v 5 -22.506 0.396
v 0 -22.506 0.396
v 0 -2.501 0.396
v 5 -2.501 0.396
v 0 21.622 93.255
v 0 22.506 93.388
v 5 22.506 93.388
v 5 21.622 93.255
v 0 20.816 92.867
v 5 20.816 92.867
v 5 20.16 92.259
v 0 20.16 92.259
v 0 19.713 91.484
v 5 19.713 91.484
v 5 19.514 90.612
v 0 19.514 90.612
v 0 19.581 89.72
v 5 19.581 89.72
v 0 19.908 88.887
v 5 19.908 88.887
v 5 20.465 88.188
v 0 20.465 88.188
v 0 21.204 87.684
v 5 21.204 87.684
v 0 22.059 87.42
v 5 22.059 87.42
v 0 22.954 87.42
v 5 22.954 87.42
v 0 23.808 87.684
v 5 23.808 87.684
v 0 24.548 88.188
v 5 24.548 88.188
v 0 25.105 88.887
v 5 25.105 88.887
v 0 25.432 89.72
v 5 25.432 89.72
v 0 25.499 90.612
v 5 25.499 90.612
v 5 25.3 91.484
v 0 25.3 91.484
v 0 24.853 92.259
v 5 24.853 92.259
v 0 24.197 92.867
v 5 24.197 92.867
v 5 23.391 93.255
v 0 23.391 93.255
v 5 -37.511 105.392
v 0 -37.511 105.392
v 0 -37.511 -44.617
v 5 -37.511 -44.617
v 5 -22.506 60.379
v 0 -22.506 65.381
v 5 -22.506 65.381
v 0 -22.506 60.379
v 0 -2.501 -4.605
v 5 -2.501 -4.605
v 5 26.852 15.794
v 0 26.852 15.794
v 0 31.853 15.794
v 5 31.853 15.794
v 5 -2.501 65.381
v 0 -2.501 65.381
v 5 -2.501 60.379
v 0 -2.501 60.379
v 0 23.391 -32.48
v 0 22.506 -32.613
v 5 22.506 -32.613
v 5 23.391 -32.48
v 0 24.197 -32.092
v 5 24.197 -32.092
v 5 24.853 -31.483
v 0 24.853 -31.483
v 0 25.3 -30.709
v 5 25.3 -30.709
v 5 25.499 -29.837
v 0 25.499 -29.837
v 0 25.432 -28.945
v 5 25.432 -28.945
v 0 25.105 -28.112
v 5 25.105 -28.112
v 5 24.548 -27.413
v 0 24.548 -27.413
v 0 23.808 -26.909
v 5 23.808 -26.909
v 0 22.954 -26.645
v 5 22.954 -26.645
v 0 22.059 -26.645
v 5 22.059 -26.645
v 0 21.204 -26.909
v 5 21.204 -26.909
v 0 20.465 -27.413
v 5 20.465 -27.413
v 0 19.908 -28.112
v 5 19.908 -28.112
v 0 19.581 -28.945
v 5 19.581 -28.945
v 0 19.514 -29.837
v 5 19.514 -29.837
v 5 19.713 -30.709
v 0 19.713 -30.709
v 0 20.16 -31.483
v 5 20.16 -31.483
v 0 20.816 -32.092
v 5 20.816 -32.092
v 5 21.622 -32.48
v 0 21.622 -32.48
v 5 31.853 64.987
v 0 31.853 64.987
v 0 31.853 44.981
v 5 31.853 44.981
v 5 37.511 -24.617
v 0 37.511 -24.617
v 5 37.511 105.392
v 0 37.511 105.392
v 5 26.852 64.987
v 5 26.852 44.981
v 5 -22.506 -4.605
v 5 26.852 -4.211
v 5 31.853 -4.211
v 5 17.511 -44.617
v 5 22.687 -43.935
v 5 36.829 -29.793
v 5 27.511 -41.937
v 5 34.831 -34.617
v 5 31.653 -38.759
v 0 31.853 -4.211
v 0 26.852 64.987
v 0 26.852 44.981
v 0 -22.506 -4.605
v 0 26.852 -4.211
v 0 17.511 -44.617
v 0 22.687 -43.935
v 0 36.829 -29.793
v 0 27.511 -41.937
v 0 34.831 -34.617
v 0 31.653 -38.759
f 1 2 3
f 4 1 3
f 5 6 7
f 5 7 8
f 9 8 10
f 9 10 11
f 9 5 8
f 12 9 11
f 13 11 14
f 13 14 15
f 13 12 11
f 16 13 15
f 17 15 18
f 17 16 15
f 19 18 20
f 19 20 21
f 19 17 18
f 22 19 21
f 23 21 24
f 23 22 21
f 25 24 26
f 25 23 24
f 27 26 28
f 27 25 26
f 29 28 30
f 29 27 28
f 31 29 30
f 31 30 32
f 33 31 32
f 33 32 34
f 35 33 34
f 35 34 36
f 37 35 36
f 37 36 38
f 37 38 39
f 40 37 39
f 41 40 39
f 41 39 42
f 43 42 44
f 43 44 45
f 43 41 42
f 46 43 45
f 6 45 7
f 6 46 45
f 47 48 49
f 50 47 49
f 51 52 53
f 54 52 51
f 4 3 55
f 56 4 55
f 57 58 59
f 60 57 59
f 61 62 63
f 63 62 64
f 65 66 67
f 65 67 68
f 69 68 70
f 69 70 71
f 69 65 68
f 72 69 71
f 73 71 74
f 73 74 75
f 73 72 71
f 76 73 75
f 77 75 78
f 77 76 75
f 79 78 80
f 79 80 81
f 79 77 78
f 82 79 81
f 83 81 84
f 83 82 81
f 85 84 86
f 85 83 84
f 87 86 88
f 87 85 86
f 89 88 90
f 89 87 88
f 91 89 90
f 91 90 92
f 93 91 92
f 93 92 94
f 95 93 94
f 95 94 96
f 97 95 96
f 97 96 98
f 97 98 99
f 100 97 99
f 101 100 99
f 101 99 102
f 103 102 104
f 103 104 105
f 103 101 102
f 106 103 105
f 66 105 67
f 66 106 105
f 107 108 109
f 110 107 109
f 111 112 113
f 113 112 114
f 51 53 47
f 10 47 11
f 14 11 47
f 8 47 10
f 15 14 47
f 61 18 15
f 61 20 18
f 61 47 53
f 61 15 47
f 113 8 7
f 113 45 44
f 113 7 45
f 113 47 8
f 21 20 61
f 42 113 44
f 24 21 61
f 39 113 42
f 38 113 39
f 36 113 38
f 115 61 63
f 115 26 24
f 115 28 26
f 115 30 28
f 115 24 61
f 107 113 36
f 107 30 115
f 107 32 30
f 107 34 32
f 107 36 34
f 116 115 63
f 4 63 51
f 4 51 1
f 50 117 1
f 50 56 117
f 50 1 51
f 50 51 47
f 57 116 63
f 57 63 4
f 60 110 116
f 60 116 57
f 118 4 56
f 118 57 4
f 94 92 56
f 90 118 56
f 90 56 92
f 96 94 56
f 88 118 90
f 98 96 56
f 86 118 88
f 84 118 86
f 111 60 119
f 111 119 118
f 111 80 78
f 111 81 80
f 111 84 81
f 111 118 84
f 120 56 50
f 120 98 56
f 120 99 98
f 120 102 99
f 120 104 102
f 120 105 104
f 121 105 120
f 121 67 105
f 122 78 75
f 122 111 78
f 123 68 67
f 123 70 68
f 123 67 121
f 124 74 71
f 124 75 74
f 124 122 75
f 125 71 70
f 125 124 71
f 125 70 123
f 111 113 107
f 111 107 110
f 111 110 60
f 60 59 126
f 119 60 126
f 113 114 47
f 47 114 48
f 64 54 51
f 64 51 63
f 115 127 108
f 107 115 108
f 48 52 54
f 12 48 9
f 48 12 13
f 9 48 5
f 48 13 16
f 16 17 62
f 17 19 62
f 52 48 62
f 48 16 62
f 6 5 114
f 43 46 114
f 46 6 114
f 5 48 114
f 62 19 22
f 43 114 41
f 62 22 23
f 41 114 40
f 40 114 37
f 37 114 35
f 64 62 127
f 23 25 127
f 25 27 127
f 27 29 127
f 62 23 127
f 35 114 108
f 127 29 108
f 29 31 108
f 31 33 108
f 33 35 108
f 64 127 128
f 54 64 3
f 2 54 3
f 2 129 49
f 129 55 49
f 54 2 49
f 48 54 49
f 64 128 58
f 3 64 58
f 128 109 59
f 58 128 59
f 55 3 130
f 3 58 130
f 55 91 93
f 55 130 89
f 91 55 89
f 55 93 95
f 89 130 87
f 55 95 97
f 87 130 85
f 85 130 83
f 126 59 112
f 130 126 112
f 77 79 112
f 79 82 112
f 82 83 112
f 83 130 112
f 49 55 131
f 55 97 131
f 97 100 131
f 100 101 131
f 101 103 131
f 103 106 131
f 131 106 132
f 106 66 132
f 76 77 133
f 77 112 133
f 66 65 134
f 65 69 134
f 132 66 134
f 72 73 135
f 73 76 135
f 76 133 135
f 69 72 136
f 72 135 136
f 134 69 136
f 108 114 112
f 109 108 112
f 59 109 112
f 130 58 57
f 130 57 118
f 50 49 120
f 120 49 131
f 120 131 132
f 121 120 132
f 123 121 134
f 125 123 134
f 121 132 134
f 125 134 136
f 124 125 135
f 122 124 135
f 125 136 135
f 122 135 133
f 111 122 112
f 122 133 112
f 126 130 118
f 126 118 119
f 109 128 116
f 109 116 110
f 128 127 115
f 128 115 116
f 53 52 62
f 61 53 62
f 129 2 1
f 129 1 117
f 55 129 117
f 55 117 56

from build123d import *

# Parameters (mm, degrees)
SKETCH1_R           = 3.000854516
SKETCH1_W           = 5.001424193
SKETCH1_H           = 20.005696775
SKETCH1_W_2         = 20.005696776
SKETCH1_H_2         = 5.001424194
SKETCH1_W_3         = 20.005696775
SKETCH1_W_4         = 5.001424194
BOSS_EXTRUDE1_DEPTH = 5


with BuildPart() as part:
    # Sketch1 → Boss-Extrude1 (new body)
    with BuildSketch(Plane(origin=(0, 0, 0), x_dir=(0, 0, -1), z_dir=(1, 0, 0))):
        with BuildLine():
            Line((-105.391894776, -37.510681454), (44.616650387, -37.510681454))
            Line((44.616650387, -37.510681454), (44.616650387, 17.510681454))
            ThreePointArc((44.616650387, 17.510681454), (38.758786011, 31.652817078), (24.616650387, 37.510681454))
            Line((24.616650387, 37.510681454), (-105.391894776, 37.510681454))
            Line((-105.391894776, 37.510681454), (-105.391894776, -37.510681454))
        make_face()
        with Locations((29.612377806, 22.506408872)):
            Circle(SKETCH1_R, mode=Mode.SUBTRACT)
        with Locations(Location((-90.387622194, 22.506408872, 0), (0, 0, 180))):
            Circle(SKETCH1_R, mode=Mode.SUBTRACT)
        with Locations((2.10454474, -12.503560485)):
            Rectangle(SKETCH1_W, SKETCH1_H, mode=Mode.SUBTRACT)
        with Locations((-5.791359719, 29.352456285)):
            Rectangle(SKETCH1_W_2, SKETCH1_H_2, mode=Mode.SUBTRACT)
        with Locations((-54.98388467, 29.352456285)):
            Rectangle(SKETCH1_W_3, SKETCH1_H_2, mode=Mode.SUBTRACT)
        with Locations((-62.879789128, -12.503560485)):
            Rectangle(SKETCH1_W_4, SKETCH1_H, mode=Mode.SUBTRACT)
    extrude(amount=BOSS_EXTRUDE1_DEPTH)


solid = part.part
